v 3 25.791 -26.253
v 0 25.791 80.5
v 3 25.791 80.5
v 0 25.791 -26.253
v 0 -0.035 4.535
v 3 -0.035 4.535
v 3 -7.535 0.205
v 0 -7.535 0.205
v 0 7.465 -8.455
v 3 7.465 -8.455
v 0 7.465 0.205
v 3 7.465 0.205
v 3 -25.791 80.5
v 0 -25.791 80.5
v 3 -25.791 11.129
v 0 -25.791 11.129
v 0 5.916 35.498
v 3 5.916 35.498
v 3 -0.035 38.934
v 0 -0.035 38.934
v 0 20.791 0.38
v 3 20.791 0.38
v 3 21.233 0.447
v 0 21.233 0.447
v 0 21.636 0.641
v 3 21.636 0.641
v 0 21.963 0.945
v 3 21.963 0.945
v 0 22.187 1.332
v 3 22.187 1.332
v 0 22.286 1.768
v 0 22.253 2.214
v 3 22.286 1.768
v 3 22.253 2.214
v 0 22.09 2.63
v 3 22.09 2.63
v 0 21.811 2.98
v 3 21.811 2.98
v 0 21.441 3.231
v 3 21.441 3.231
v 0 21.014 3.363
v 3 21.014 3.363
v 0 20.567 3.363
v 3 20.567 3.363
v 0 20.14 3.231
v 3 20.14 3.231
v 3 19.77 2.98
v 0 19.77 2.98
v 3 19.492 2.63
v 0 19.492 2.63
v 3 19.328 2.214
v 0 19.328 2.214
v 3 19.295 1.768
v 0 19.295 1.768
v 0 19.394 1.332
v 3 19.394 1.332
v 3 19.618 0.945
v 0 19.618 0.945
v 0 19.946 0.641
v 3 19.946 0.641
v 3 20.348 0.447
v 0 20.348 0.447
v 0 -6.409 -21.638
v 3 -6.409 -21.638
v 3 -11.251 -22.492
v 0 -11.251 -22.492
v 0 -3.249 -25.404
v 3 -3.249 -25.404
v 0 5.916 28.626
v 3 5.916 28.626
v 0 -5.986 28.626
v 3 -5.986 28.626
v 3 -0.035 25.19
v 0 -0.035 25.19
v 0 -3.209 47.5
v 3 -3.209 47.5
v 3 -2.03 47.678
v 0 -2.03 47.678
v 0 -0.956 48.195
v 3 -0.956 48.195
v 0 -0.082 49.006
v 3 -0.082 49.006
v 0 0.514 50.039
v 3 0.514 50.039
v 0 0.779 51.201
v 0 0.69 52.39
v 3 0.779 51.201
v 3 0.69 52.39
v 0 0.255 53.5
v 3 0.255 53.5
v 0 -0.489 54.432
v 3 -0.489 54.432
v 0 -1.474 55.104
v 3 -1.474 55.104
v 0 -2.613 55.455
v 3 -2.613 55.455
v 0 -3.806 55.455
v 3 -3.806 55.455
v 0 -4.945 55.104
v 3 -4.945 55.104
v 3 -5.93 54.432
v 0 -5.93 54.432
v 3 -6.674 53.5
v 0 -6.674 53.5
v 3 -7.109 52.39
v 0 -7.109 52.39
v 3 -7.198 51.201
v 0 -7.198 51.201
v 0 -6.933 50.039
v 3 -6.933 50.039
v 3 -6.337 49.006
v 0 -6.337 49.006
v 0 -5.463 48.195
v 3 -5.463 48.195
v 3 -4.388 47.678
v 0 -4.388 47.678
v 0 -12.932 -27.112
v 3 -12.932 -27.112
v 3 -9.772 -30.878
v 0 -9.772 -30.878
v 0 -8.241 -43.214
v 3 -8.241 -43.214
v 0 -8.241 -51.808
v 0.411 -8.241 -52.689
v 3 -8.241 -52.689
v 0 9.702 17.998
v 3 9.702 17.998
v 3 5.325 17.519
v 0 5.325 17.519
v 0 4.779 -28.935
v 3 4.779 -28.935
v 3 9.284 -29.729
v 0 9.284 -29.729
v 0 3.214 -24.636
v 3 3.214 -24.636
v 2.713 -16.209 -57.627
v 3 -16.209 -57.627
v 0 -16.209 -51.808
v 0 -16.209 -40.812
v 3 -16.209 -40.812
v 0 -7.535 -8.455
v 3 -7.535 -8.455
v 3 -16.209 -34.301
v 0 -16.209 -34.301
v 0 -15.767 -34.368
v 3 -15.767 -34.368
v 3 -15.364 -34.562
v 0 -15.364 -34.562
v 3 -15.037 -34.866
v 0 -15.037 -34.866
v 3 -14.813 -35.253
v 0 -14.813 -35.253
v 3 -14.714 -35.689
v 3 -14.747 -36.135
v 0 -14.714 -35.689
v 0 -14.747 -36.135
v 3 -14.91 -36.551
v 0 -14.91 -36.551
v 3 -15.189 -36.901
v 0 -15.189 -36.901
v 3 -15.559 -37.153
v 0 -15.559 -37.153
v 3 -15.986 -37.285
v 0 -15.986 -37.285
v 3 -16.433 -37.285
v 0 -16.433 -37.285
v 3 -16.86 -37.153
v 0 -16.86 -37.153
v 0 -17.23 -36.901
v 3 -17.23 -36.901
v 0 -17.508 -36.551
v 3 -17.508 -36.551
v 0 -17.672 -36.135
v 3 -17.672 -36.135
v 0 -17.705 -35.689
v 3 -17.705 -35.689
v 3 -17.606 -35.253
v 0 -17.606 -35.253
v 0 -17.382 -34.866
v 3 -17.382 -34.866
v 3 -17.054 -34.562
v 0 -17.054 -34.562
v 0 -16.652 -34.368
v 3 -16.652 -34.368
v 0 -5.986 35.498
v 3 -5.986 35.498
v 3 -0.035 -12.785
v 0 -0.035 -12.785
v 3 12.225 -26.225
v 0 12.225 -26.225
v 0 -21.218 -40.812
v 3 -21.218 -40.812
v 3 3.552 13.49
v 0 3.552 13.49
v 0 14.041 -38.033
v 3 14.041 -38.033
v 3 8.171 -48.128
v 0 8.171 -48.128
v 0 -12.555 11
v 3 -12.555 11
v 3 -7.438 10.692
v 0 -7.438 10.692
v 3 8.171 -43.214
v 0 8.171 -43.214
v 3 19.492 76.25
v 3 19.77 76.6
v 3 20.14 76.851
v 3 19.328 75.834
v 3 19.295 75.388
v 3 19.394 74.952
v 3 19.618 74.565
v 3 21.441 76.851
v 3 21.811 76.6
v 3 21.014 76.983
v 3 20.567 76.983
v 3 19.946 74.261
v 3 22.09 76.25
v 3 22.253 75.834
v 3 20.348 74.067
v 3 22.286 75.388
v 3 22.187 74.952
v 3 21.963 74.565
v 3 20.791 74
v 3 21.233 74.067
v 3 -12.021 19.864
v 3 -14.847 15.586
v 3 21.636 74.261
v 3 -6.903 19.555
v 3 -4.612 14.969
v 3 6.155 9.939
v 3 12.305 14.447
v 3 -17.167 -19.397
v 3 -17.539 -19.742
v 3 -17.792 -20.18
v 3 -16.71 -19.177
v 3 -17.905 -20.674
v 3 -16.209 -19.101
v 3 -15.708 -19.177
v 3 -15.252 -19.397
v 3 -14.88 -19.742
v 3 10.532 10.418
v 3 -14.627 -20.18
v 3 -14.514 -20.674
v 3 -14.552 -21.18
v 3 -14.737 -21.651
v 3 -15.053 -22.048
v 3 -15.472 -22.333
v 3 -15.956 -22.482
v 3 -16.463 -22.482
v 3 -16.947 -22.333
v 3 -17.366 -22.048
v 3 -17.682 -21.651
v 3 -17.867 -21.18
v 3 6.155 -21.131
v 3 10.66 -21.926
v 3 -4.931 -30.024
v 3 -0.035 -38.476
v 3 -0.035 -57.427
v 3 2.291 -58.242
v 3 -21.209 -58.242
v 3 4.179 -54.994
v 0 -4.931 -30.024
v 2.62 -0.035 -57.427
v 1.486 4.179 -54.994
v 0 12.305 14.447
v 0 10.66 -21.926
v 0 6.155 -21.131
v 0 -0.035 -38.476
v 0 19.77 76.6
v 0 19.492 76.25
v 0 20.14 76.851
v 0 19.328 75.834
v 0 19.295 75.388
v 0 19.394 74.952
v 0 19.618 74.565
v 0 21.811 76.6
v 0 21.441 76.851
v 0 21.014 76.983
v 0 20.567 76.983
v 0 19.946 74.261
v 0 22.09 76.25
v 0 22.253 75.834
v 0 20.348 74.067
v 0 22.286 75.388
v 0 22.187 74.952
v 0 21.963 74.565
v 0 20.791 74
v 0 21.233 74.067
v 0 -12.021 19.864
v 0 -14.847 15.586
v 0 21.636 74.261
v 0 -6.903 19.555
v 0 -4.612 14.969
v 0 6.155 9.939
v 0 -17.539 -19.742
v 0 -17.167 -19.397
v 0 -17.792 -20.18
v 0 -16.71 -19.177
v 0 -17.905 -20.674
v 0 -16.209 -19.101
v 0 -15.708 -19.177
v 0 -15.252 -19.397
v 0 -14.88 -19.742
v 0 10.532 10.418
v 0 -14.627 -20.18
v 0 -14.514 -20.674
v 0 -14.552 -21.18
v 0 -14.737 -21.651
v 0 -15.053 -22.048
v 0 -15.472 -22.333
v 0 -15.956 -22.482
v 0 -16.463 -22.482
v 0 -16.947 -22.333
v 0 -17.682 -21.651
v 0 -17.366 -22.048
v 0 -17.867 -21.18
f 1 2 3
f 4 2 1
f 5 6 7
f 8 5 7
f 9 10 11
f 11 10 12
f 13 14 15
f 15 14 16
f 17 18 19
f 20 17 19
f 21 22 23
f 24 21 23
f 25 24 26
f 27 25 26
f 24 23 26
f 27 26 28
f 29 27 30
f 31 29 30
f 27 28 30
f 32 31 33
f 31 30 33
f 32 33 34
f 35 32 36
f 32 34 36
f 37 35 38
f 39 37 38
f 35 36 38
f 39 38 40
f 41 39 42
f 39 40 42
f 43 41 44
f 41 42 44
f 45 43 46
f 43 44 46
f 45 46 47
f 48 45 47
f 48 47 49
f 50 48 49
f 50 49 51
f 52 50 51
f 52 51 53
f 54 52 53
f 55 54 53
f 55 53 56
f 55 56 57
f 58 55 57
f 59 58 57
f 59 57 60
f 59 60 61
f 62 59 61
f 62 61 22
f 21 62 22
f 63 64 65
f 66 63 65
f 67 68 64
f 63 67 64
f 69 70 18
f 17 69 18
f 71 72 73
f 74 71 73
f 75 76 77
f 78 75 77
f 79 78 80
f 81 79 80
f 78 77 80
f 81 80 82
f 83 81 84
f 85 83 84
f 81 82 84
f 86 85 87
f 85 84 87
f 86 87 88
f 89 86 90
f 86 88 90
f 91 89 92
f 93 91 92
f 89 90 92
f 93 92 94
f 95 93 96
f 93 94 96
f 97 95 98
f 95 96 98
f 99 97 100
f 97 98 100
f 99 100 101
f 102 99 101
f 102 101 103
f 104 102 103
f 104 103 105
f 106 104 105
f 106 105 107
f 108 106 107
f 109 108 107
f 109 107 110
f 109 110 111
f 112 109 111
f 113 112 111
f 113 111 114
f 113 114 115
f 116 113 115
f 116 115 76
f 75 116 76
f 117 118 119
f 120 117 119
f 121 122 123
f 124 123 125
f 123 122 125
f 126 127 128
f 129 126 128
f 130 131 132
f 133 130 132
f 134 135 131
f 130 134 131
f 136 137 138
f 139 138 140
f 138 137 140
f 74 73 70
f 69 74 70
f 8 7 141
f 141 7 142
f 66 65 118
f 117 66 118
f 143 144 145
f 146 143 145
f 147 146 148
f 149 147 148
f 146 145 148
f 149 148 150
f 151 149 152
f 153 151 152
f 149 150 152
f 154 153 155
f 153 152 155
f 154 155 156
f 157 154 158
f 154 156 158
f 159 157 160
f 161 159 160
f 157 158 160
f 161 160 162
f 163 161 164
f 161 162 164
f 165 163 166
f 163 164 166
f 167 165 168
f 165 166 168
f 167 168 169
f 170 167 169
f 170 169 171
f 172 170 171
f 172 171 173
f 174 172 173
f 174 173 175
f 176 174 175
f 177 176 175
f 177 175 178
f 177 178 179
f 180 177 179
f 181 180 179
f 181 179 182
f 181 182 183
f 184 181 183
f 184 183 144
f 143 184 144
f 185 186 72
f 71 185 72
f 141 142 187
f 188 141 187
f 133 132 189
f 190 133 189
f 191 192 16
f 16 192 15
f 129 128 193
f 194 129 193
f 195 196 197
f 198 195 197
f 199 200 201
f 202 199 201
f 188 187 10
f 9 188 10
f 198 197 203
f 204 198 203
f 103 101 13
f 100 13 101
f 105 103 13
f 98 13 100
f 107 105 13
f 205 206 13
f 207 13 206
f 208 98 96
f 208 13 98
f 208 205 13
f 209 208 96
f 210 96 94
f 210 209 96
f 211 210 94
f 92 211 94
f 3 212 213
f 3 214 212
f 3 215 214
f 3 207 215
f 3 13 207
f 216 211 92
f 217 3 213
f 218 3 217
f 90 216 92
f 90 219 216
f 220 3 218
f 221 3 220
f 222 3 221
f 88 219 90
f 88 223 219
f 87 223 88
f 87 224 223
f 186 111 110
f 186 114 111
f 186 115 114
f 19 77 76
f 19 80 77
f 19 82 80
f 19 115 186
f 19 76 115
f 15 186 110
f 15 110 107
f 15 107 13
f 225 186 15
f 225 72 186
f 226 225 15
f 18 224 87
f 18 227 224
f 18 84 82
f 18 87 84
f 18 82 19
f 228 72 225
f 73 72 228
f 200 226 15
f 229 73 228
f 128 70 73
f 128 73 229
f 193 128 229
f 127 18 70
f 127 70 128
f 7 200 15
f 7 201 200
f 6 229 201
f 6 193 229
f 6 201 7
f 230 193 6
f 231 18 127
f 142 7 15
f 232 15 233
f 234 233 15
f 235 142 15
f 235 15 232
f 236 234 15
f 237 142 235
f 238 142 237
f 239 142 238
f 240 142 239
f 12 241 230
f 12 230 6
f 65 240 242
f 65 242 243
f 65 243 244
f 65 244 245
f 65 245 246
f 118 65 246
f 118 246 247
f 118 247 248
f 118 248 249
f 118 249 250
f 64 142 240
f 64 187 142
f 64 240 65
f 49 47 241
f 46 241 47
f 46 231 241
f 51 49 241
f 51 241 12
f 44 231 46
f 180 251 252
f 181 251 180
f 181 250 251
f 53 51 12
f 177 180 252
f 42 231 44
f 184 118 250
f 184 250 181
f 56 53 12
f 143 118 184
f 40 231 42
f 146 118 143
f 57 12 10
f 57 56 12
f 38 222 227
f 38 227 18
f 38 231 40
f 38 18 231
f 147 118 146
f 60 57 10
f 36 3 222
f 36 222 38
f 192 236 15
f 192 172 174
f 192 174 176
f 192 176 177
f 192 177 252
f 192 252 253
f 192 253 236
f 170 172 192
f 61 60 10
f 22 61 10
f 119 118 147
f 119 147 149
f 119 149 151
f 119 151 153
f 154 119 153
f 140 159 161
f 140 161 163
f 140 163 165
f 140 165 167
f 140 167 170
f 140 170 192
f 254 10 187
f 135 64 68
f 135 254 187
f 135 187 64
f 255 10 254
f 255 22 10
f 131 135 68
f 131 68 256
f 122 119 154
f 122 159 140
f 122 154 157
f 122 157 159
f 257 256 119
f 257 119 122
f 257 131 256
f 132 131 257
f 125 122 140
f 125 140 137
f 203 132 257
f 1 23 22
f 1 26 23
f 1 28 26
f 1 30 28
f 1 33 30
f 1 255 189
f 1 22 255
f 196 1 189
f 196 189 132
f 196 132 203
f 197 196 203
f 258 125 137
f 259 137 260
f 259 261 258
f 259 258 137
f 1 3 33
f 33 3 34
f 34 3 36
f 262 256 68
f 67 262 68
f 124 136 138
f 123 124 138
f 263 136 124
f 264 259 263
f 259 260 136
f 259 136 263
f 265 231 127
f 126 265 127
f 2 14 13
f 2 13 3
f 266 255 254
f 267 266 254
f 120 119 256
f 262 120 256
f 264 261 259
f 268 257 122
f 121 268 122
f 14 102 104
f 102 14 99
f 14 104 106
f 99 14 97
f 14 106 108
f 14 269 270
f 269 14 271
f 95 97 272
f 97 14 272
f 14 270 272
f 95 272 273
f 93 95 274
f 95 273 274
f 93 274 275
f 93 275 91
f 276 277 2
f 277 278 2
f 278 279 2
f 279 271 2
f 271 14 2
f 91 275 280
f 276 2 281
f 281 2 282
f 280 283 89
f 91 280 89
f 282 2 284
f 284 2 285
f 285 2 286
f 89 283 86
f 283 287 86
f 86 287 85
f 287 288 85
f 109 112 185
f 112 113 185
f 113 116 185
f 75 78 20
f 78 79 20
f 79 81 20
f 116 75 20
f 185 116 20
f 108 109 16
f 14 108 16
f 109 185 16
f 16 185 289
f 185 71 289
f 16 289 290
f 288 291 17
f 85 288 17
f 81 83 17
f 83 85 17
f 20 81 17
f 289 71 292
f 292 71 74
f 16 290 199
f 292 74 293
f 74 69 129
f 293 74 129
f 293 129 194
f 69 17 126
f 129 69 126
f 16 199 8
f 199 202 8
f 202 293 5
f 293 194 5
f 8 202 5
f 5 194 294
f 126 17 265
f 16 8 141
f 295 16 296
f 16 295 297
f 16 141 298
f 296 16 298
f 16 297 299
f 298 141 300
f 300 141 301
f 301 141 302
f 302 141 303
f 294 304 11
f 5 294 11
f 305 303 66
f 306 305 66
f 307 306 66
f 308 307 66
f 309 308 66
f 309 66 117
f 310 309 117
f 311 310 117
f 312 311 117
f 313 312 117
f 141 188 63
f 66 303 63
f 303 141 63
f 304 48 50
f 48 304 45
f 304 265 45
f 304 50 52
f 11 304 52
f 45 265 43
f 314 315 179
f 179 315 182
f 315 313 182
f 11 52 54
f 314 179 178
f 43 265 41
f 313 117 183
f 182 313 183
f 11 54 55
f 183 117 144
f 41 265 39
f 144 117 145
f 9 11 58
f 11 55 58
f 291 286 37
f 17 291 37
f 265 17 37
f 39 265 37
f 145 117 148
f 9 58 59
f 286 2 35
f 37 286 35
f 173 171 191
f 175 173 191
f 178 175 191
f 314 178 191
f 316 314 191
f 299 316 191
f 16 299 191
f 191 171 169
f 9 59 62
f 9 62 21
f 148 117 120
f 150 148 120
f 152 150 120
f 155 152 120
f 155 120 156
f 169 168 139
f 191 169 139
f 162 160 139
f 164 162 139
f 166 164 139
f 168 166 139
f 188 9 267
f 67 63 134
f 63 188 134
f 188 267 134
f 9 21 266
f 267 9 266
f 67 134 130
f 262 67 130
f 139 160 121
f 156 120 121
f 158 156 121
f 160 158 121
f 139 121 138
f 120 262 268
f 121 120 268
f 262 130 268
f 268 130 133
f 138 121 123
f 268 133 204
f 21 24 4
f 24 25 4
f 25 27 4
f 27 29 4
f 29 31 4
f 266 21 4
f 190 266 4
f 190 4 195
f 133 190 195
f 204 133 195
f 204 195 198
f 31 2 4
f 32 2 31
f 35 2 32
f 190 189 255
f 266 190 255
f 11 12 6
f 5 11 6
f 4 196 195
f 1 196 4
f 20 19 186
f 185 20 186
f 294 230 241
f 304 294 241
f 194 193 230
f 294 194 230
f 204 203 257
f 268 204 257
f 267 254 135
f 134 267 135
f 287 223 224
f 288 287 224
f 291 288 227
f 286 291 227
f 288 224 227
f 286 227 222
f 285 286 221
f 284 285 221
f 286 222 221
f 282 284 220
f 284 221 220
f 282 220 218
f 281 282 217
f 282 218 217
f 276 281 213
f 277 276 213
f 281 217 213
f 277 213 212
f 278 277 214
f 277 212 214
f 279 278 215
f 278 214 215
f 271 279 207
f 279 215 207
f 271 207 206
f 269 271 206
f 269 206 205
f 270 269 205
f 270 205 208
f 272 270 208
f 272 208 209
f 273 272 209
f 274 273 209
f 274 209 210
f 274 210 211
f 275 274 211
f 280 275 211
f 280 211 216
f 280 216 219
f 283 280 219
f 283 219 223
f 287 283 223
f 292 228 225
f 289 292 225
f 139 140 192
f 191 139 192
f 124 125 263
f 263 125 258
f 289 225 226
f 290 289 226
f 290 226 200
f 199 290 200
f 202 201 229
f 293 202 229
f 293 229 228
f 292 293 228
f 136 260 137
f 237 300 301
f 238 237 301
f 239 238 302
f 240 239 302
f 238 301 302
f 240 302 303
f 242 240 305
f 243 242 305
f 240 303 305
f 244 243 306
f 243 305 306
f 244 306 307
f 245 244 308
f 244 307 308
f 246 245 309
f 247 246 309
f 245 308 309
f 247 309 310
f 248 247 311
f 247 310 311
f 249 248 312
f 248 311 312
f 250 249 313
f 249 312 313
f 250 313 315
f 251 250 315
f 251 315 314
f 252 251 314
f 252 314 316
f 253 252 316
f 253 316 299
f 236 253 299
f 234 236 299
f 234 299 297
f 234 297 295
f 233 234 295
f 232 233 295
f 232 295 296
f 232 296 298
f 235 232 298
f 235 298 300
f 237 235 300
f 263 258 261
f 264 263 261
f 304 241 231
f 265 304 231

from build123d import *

# Parameters (mm, degrees)
CROQUIS1_W              = 161
CROQUIS1_H              = 51.5812
SALIENTE_EXTRUIR1_DEPTH = 3
CORTAR_EXTRUIR1_REACH   = 5
CROQUIS2_R              = 1.5
CROQUIS2_R_2            = 4
CORTAR_EXTRUIR2_REACH   = 5
CROQUIS3_R              = 1.5
CORTAR_EXTRUIR3_REACH   = 53.581
CORTAR_EXTRUIR4_DEPTH   = 3
CORTAR_EXTRUIR5_DEPTH   = 10
CORTAR_EXTRUIR6_REACH   = 5
CORTAR_EXTRUIR7_REACH   = 5
CROQUIS11_R             = 1.7
CORTAR_EXTRUIR9_DEPTH   = 10
CORTAR_EXTRUIR10_REACH  = 5


with BuildPart() as part:
    # Croquis1 → Saliente-Extruir1 (new body)
    with BuildSketch(Plane(origin=(0, 0, 0), x_dir=(0, 0, -1), z_dir=(1, 0, 0))):
        Rectangle(CROQUIS1_W, CROQUIS1_H)
    extrude(amount=SALIENTE_EXTRUIR1_DEPTH)

    # Croquis2 → Cortar-Extruir1 (cut, up to next)
    with BuildSketch(Plane(origin=(3, 0, 0), x_dir=(0, 0, -1), z_dir=(1, 0, 0)), mode=Mode.PRIVATE) as cortar_extruir1_sk1:
        with Locations((-75.5, 20.7906)):
            Circle(CROQUIS2_R)
    cortar_extruir1_tool1 = extrude(cortar_extruir1_sk1.sketch, amount=-CORTAR_EXTRUIR1_REACH, mode=Mode.PRIVATE) & part.part
    add(cortar_extruir1_tool1.solids().sort_by_distance((3, 20.7906, 75.5))[0], mode=Mode.SUBTRACT)
    # Croquis2 → Cortar-Extruir1 (cut, up to next)
    with BuildSketch(Plane(origin=(3, 0, 0), x_dir=(0, 0, -1), z_dir=(1, 0, 0)), mode=Mode.PRIVATE) as cortar_extruir1_sk2:
        with Locations((-1.88, 20.7906)):
            Circle(CROQUIS2_R)
    cortar_extruir1_tool2 = extrude(cortar_extruir1_sk2.sketch, amount=-CORTAR_EXTRUIR1_REACH, mode=Mode.PRIVATE) & part.part
    add(cortar_extruir1_tool2.solids().sort_by_distance((3, 20.7906, 1.88))[0], mode=Mode.SUBTRACT)
    # Croquis2 → Cortar-Extruir1 (cut, up to next)
    with BuildSketch(Plane(origin=(3, 0, 0), x_dir=(0, 0, -1), z_dir=(1, 0, 0)), mode=Mode.PRIVATE) as cortar_extruir1_sk3:
        with Locations((-51.5, -3.2094)):
            Circle(CROQUIS2_R_2)
    cortar_extruir1_tool3 = extrude(cortar_extruir1_sk3.sketch, amount=-CORTAR_EXTRUIR1_REACH, mode=Mode.PRIVATE) & part.part
    add(cortar_extruir1_tool3.solids().sort_by_distance((3, -3.2094, 51.5))[0], mode=Mode.SUBTRACT)

    # Croquis3 → Cortar-Extruir2 (cut, up to next)
    with BuildSketch(Plane.ZY, mode=Mode.PRIVATE) as cortar_extruir2_sk1:
        with Locations((-35.801477372, -16.2094)):
            Circle(CROQUIS3_R)
    cortar_extruir2_tool1 = extrude(cortar_extruir2_sk1.sketch, amount=-CORTAR_EXTRUIR2_REACH, mode=Mode.PRIVATE) & part.part
    add(cortar_extruir2_tool1.solids().sort_by_distance((0, -16.2094, -35.801477))[0], mode=Mode.SUBTRACT)

    # Croquis4 → Cortar-Extruir3 (cut, up to next)
    with BuildSketch(Plane(origin=(0, 25.7906, 0), x_dir=(1, 0, 0), z_dir=(0, 1, 0)), mode=Mode.PRIVATE) as cortar_extruir3_sk1:
        Polygon((0, 80.5), (3, 80.5), (3, 58.241825474), (0, 51.808304713), align=None)
    cortar_extruir3_tool1 = extrude(cortar_extruir3_sk1.sketch, amount=-CORTAR_EXTRUIR3_REACH, mode=Mode.PRIVATE) & part.part
    add(cortar_extruir3_tool1.solids().sort_by_distance((1.436864, 25.7906, -67.694835))[0], mode=Mode.SUBTRACT)

    # Croquis5 → Cortar-Extruir4 (cut)
    with BuildSketch(Plane(origin=(3, 0, 0), x_dir=(0, 0, -1), z_dir=(1, 0, 0))):
        Polygon((58.241825474, -25.7906), (58.241825474, -21.2094), (40.910881748, -21.2094), (-11.129087263, -25.7906), align=None)
    extrude(amount=-CORTAR_EXTRUIR4_DEPTH, mode=Mode.SUBTRACT)

    # Croquis6 → Cortar-Extruir5 (cut)
    with BuildSketch(Plane(origin=(3, 0, 0), x_dir=(0, 0, -1), z_dir=(1, 0, 0))):
        Polygon((58.241825474, 25.7906), (38.033287015, 25.7906), (38.033287015, 14.0406), (58.241825474, 2.2906), align=None)
    extrude(amount=-CORTAR_EXTRUIR5_DEPTH, mode=Mode.SUBTRACT)

    # Croquis7 → Cortar-Extruir6 (cut, up to next)
    with BuildSketch(Plane(origin=(3, 0, 0), x_dir=(0, 0, -1), z_dir=(1, 0, 0)), mode=Mode.PRIVATE) as cortar_extruir6_sk1:
        Polygon((38.033287015, 25.7906), (38.033287015, 14.0406), (26.25345467, 25.7906), align=None)
    cortar_extruir6_tool1 = extrude(cortar_extruir6_sk1.sketch, amount=-CORTAR_EXTRUIR6_REACH, mode=Mode.PRIVATE) & part.part
    add(cortar_extruir6_tool1.solids().sort_by_distance((3, 21.873933, -34.106676))[0], mode=Mode.SUBTRACT)

    # Croquis8 → Cortar-Extruir7 (cut, up to next)
    with BuildSketch(Plane(origin=(3, 0, 0), x_dir=(0, 0, -1), z_dir=(1, 0, 0)), mode=Mode.PRIVATE) as cortar_extruir7_sk1:
        Polygon((-38.933678241, -0.034975248), (-35.497792077, -5.986104652), (-28.626019751, -5.986104652), (-25.190133587, -0.034975248), (-28.626019751, 5.916154156), (-35.497792077, 5.916154156), align=None)
    cortar_extruir7_tool1 = extrude(cortar_extruir7_sk1.sketch, amount=-CORTAR_EXTRUIR7_REACH, mode=Mode.PRIVATE) & part.part
    add(cortar_extruir7_tool1.solids().sort_by_distance((3, -0.034975, 32.061906))[0], mode=Mode.SUBTRACT)
    # Croquis8 → Cortar-Extruir7 (cut, up to next)
    with BuildSketch(Plane(origin=(3, 0, 0), x_dir=(0, 0, -1), z_dir=(1, 0, 0)), mode=Mode.PRIVATE) as cortar_extruir7_sk2:
        Polygon((12.785187373, -0.034975248), (8.455060354, 7.465024752), (-0.205193684, 7.465024752), (-4.535320703, -0.034975248), (-0.205193684, -7.534975248), (8.455060354, -7.534975248), align=None)
    cortar_extruir7_tool2 = extrude(cortar_extruir7_sk2.sketch, amount=-CORTAR_EXTRUIR7_REACH, mode=Mode.PRIVATE) & part.part
    add(cortar_extruir7_tool2.solids().sort_by_distance((3, -0.034975, -4.124933))[0], mode=Mode.SUBTRACT)
    # Croquis8 → Cortar-Extruir7 (cut, up to next)
    with BuildSketch(Plane(origin=(3, 0, 0), x_dir=(0, 0, -1), z_dir=(1, 0, 0)), mode=Mode.PRIVATE) as cortar_extruir7_sk3:
        Polygon((29.729088218, 9.284175003), (26.224654714, 12.224743864), (21.925830627, 10.660099854), (21.131440044, 6.154886983), (24.635873548, 3.214318123), (28.934697635, 4.778962133), align=None)
    cortar_extruir7_tool3 = extrude(cortar_extruir7_sk3.sketch, amount=-CORTAR_EXTRUIR7_REACH, mode=Mode.PRIVATE) & part.part
    add(cortar_extruir7_tool3.solids().sort_by_distance((3, 7.719531, -25.430264))[0], mode=Mode.SUBTRACT)
    # Croquis8 → Cortar-Extruir7 (cut, up to next)
    with BuildSketch(Plane(origin=(3, 0, 0), x_dir=(0, 0, -1), z_dir=(1, 0, 0)), mode=Mode.PRIVATE) as cortar_extruir7_sk4:
        Polygon((-19.863794393, -12.020805521), (-15.586299257, -14.846787524), (-11.000179483, -12.555359073), (-10.691554846, -7.437948619), (-14.969049982, -4.611966616), (-19.555169756, -6.903395067), align=None)
    cortar_extruir7_tool4 = extrude(cortar_extruir7_sk4.sketch, amount=-CORTAR_EXTRUIR7_REACH, mode=Mode.PRIVATE) & part.part
    add(cortar_extruir7_tool4.solids().sort_by_distance((3, -9.729377, 15.277675))[0], mode=Mode.SUBTRACT)
    # Croquis8 → Cortar-Extruir7 (cut, up to next)
    with BuildSketch(Plane(origin=(3, 0, 0), x_dir=(0, 0, -1), z_dir=(1, 0, 0)), mode=Mode.PRIVATE) as cortar_extruir7_sk5:
        Polygon((-17.998312172, 9.702211727), (-17.519435903, 5.325448954), (-13.48961002, 3.551786582), (-9.938660407, 6.154886983), (-10.417536677, 10.531649757), (-14.447362559, 12.305312128), align=None)
    cortar_extruir7_tool5 = extrude(cortar_extruir7_sk5.sketch, amount=-CORTAR_EXTRUIR7_REACH, mode=Mode.PRIVATE) & part.part
    add(cortar_extruir7_tool5.solids().sort_by_distance((3, 7.928549, 13.968486))[0], mode=Mode.SUBTRACT)
    # Croquis8 → Cortar-Extruir7 (cut, up to next)
    with BuildSketch(Plane(origin=(3, 0, 0), x_dir=(0, 0, -1), z_dir=(1, 0, 0)), mode=Mode.PRIVATE) as cortar_extruir7_sk6:
        Polygon((30.877634676, -9.772162222), (30.023928106, -4.930551671), (25.404117088, -3.249077972), (21.63801264, -6.409214825), (22.491719211, -11.250825377), (27.111530229, -12.932299075), align=None)
    cortar_extruir7_tool6 = extrude(cortar_extruir7_sk6.sketch, amount=-CORTAR_EXTRUIR7_REACH, mode=Mode.PRIVATE) & part.part
    add(cortar_extruir7_tool6.solids().sort_by_distance((3, -8.090689, -26.257824))[0], mode=Mode.SUBTRACT)
    # Croquis8 → Cortar-Extruir7 (cut, up to next)
    with BuildSketch(Plane(origin=(3, 0, 0), x_dir=(0, 0, -1), z_dir=(1, 0, 0)), mode=Mode.PRIVATE) as cortar_extruir7_sk7:
        Polygon((57.427116401, -0.034975248), (52.689414159, 8.170965745), (43.214009677, 8.170965745), (38.476307436, -0.034975248), (43.214009677, -8.240916241), (52.689414159, -8.240916241), align=None)
    cortar_extruir7_tool7 = extrude(cortar_extruir7_sk7.sketch, amount=-CORTAR_EXTRUIR7_REACH, mode=Mode.PRIVATE) & part.part
    add(cortar_extruir7_tool7.solids().sort_by_distance((3, -0.034975, -47.951712))[0], mode=Mode.SUBTRACT)

    # Croquis11 → Cortar-Extruir9 (cut)
    with BuildSketch(Plane.ZY):
        with Locations((-20.801477372, -16.2094)):
            Circle(CROQUIS11_R)
    extrude(amount=-CORTAR_EXTRUIR9_DEPTH, mode=Mode.SUBTRACT)

    # Croquis12 → Cortar-Extruir10 (cut, up to next)
    with BuildSketch(Plane(origin=(3, 0, 0), x_dir=(0, 0, -1), z_dir=(1, 0, 0)), mode=Mode.PRIVATE) as cortar_extruir10_sk1:
        Polygon((58.241825474, -21.2094), (57.627058446, -16.2094), (40.81163491, -16.2094), (40.81163491, -21.218136931), (40.910881748, -21.2094), align=None)
    cortar_extruir10_tool1 = extrude(cortar_extruir10_sk1.sketch, amount=-CORTAR_EXTRUIR10_REACH, mode=Mode.PRIVATE) & part.part
    add(cortar_extruir10_tool1.solids().sort_by_distance((3, -18.724372, -49.373915))[0], mode=Mode.SUBTRACT)


solid = part.part
